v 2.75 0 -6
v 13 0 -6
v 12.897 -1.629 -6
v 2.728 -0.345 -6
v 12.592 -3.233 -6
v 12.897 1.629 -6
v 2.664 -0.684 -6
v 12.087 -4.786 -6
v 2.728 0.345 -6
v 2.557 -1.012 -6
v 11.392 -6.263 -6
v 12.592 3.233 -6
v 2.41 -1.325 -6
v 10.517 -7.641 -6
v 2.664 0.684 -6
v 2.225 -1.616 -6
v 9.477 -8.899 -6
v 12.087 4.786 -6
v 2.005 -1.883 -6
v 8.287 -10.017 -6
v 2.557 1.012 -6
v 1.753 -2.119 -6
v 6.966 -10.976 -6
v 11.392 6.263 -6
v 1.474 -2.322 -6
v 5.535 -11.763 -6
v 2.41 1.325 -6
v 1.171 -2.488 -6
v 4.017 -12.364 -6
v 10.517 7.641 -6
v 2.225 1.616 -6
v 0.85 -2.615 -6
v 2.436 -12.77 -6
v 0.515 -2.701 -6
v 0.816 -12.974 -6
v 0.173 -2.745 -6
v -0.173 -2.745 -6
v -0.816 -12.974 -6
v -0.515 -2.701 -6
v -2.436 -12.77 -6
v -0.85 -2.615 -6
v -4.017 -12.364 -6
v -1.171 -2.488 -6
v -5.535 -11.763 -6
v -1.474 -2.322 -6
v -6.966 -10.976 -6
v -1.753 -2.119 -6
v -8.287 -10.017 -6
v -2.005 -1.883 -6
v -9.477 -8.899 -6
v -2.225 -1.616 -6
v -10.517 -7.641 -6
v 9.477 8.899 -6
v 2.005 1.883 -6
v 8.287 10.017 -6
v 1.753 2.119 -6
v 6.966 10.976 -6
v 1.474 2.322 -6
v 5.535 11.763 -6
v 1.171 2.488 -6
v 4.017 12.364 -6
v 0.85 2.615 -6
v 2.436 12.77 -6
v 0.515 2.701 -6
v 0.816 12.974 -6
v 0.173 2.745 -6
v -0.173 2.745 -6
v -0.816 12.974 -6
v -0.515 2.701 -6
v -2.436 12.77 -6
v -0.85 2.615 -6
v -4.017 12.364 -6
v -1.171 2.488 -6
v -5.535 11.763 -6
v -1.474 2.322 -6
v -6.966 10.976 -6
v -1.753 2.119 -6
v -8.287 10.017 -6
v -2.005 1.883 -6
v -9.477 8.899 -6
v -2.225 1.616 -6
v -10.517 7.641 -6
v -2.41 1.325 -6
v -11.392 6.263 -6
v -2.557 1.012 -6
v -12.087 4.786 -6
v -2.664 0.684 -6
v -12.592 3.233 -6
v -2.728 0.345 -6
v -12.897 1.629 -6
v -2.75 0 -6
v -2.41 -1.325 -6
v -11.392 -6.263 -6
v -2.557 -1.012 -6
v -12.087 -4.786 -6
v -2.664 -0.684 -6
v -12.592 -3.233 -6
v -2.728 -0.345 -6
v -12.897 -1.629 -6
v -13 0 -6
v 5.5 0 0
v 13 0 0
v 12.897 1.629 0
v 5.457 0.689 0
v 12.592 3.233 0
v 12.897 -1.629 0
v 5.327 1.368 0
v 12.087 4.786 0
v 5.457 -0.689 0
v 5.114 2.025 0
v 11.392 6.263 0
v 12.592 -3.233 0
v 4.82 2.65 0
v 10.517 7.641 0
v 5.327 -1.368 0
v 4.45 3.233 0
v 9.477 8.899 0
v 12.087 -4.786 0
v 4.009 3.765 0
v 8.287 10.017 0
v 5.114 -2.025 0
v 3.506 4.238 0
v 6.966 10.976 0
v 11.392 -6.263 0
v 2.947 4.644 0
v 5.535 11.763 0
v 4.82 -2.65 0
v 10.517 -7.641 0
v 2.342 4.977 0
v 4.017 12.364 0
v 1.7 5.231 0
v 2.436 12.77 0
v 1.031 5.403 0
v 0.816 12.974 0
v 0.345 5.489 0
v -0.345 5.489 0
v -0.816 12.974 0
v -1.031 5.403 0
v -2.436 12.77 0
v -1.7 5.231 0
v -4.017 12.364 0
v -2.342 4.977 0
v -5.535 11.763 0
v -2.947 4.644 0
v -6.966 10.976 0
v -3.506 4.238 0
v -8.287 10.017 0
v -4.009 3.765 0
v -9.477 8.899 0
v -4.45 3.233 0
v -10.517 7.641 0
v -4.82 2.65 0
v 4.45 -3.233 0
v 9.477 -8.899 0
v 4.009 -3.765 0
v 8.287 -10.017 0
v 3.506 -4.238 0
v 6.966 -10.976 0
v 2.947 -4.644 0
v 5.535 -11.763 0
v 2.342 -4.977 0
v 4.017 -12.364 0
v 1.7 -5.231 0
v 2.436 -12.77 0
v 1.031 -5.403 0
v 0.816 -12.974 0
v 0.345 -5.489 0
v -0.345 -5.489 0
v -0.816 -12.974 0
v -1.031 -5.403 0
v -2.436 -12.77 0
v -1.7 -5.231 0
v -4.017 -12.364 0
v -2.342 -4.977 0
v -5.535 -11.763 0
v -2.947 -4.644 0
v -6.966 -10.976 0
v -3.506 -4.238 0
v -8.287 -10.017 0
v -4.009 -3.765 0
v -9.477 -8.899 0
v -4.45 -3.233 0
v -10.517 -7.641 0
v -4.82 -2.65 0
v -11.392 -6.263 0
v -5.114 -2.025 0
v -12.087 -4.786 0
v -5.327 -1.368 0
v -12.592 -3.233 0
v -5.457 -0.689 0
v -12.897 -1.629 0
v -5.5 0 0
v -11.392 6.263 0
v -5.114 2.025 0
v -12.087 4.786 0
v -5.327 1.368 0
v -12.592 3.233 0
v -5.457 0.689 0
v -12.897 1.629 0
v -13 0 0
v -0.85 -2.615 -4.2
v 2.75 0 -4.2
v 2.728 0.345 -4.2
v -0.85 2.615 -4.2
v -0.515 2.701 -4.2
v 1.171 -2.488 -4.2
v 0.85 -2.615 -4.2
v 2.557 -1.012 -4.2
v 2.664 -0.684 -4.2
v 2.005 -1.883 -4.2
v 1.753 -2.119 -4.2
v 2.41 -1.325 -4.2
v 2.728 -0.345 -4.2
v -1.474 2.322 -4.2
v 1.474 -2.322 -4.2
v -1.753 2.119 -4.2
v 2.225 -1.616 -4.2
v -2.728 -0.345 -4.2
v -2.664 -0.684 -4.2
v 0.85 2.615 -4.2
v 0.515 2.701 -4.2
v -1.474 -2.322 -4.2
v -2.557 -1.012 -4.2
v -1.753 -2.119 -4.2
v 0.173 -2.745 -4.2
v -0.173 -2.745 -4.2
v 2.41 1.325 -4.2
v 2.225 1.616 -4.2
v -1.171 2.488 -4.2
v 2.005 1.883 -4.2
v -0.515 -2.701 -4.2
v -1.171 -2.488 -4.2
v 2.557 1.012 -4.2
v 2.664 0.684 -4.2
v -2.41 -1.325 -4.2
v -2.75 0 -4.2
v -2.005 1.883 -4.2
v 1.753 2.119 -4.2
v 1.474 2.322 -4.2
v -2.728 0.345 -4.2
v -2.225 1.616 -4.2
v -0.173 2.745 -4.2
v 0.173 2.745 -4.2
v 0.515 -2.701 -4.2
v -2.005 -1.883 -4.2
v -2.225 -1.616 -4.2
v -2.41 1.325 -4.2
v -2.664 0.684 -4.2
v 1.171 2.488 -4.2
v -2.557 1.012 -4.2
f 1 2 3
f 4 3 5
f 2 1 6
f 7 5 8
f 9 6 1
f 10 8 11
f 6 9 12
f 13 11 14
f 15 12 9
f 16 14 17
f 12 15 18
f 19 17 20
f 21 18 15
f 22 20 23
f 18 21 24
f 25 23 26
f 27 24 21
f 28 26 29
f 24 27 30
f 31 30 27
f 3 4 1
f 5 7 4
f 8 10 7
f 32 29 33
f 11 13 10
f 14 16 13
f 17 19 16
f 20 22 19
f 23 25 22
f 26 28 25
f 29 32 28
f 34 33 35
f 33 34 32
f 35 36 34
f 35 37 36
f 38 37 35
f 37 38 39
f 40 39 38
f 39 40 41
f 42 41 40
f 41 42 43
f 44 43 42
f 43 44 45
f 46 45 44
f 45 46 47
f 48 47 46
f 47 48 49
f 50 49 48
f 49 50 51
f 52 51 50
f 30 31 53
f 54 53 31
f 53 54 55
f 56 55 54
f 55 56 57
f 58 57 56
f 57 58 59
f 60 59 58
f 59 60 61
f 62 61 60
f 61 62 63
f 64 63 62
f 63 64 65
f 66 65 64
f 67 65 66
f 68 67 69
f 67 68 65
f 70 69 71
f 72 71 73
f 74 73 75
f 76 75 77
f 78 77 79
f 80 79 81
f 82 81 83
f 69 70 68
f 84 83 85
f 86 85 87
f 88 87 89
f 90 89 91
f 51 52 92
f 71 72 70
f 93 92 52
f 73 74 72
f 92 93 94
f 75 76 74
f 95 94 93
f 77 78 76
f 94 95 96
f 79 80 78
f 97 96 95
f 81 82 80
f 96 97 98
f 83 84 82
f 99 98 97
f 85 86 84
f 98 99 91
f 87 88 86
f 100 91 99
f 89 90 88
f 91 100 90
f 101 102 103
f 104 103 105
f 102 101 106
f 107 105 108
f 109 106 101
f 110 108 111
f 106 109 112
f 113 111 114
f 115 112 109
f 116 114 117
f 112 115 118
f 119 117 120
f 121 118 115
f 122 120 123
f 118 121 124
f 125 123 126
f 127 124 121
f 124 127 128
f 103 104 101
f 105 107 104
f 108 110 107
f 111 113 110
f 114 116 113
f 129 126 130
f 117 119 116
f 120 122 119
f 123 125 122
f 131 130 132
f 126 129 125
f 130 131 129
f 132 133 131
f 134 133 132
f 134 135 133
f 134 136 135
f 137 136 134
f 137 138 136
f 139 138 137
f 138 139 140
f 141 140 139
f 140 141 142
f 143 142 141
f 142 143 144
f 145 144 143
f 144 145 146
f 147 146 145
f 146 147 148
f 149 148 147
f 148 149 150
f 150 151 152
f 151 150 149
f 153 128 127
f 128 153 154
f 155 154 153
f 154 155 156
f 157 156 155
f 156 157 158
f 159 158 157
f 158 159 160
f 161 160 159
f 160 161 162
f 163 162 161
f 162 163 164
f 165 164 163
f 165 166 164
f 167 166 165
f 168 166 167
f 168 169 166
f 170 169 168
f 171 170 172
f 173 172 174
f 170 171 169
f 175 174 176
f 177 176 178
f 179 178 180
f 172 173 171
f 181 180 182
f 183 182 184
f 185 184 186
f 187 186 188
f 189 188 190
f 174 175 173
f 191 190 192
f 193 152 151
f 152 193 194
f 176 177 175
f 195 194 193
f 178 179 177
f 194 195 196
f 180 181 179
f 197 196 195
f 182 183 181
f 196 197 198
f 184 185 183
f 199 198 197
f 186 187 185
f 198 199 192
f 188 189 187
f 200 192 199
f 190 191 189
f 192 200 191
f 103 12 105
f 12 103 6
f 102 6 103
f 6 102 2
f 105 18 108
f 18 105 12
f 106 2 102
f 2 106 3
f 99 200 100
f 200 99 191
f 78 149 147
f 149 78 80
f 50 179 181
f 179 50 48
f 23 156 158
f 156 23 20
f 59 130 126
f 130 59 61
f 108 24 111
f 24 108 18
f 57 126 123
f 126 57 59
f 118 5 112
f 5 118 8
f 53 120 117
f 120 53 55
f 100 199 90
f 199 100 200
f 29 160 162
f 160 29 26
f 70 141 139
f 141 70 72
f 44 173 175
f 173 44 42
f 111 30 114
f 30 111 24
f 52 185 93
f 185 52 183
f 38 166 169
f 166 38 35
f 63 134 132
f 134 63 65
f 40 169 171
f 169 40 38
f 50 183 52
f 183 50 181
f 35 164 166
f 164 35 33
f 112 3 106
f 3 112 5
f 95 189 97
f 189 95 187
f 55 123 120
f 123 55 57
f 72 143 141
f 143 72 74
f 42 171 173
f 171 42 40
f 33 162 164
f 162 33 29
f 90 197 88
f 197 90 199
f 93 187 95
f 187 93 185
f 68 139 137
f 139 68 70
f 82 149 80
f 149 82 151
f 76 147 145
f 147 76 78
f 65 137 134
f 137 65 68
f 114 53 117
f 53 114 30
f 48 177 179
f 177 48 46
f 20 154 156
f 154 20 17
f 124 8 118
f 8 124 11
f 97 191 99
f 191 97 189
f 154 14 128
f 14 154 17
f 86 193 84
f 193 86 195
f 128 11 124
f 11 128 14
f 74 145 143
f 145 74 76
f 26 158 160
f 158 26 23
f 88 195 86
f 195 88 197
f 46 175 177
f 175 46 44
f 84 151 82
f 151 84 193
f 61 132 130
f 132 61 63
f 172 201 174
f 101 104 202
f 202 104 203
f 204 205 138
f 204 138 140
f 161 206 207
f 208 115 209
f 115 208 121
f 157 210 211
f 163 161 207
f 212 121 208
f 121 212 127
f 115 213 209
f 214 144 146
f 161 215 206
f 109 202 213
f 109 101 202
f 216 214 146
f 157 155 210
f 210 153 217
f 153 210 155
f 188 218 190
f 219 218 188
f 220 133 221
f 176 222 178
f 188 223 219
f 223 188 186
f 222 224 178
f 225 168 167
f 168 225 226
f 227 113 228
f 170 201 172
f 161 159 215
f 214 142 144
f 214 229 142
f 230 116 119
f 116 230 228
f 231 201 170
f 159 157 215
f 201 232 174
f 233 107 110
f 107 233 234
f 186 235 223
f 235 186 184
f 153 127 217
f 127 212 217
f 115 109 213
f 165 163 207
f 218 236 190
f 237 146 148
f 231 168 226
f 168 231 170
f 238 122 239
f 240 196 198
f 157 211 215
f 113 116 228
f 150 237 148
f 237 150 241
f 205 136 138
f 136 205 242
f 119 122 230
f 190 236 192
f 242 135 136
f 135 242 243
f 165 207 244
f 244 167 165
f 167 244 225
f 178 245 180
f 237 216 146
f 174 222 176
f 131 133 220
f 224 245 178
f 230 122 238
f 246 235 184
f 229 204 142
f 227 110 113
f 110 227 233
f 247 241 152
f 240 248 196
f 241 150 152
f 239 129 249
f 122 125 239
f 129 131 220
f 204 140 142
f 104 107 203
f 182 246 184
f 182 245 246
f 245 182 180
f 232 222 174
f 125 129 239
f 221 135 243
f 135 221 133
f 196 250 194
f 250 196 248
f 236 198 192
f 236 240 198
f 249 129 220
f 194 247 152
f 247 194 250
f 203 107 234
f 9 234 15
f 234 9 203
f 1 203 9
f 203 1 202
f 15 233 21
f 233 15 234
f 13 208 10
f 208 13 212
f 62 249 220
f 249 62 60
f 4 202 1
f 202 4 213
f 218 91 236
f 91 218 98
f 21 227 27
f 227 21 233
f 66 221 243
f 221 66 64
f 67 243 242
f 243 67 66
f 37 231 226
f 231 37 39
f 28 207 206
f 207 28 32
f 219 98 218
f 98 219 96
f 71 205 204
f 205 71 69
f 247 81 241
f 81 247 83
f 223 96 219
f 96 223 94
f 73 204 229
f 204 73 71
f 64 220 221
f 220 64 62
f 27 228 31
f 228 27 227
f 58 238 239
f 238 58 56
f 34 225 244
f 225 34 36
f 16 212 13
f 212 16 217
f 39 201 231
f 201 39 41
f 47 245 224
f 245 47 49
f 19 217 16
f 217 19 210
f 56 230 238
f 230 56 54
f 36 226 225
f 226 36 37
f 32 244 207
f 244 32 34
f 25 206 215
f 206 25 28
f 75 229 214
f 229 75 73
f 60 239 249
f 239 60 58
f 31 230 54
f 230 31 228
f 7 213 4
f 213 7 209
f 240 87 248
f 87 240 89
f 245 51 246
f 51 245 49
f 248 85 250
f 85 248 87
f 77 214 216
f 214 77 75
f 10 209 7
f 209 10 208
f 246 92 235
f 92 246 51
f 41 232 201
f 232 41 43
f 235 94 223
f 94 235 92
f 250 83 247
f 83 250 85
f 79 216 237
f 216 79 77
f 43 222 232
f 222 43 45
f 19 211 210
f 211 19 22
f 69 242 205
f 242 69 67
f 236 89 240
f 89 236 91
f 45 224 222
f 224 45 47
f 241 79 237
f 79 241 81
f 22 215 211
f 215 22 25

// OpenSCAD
$fn = 50;


difference() {
	union() {
		translate(v = [0, 0, -6.0000000000]) {
			cylinder(h = 6, r = 7.0000000000);
		}
		translate(v = [0, 0, -6.0000000000]) {
			cylinder(h = 6, r = 13.0000000000);
		}
	}
	union() {
		translate(v = [0, 0, 0]) {
			rotate(a = [0, 0, 0]) {
				difference() {
					union() {
						#translate(v = [0, 0, -6.0000000000]) {
							cylinder(h = 6, r = 2.2500000000);
						}
						#translate(v = [0, 0, -4.2000000000]) {
							cylinder(h = 4.2000000000, r = 7.0000000000, r1 = 2.7500000000, r2 = 5.5000000000);
						}
						#translate(v = [0, 0, -6.0000000000]) {
							cylinder(h = 6, r = 2.7500000000);
						}
						#translate(v = [0, 0, -6.0000000000]) {
							cylinder(h = 6, r = 2.2500000000);
						}
					}
					union();
				}
			}
		}
	}
}
